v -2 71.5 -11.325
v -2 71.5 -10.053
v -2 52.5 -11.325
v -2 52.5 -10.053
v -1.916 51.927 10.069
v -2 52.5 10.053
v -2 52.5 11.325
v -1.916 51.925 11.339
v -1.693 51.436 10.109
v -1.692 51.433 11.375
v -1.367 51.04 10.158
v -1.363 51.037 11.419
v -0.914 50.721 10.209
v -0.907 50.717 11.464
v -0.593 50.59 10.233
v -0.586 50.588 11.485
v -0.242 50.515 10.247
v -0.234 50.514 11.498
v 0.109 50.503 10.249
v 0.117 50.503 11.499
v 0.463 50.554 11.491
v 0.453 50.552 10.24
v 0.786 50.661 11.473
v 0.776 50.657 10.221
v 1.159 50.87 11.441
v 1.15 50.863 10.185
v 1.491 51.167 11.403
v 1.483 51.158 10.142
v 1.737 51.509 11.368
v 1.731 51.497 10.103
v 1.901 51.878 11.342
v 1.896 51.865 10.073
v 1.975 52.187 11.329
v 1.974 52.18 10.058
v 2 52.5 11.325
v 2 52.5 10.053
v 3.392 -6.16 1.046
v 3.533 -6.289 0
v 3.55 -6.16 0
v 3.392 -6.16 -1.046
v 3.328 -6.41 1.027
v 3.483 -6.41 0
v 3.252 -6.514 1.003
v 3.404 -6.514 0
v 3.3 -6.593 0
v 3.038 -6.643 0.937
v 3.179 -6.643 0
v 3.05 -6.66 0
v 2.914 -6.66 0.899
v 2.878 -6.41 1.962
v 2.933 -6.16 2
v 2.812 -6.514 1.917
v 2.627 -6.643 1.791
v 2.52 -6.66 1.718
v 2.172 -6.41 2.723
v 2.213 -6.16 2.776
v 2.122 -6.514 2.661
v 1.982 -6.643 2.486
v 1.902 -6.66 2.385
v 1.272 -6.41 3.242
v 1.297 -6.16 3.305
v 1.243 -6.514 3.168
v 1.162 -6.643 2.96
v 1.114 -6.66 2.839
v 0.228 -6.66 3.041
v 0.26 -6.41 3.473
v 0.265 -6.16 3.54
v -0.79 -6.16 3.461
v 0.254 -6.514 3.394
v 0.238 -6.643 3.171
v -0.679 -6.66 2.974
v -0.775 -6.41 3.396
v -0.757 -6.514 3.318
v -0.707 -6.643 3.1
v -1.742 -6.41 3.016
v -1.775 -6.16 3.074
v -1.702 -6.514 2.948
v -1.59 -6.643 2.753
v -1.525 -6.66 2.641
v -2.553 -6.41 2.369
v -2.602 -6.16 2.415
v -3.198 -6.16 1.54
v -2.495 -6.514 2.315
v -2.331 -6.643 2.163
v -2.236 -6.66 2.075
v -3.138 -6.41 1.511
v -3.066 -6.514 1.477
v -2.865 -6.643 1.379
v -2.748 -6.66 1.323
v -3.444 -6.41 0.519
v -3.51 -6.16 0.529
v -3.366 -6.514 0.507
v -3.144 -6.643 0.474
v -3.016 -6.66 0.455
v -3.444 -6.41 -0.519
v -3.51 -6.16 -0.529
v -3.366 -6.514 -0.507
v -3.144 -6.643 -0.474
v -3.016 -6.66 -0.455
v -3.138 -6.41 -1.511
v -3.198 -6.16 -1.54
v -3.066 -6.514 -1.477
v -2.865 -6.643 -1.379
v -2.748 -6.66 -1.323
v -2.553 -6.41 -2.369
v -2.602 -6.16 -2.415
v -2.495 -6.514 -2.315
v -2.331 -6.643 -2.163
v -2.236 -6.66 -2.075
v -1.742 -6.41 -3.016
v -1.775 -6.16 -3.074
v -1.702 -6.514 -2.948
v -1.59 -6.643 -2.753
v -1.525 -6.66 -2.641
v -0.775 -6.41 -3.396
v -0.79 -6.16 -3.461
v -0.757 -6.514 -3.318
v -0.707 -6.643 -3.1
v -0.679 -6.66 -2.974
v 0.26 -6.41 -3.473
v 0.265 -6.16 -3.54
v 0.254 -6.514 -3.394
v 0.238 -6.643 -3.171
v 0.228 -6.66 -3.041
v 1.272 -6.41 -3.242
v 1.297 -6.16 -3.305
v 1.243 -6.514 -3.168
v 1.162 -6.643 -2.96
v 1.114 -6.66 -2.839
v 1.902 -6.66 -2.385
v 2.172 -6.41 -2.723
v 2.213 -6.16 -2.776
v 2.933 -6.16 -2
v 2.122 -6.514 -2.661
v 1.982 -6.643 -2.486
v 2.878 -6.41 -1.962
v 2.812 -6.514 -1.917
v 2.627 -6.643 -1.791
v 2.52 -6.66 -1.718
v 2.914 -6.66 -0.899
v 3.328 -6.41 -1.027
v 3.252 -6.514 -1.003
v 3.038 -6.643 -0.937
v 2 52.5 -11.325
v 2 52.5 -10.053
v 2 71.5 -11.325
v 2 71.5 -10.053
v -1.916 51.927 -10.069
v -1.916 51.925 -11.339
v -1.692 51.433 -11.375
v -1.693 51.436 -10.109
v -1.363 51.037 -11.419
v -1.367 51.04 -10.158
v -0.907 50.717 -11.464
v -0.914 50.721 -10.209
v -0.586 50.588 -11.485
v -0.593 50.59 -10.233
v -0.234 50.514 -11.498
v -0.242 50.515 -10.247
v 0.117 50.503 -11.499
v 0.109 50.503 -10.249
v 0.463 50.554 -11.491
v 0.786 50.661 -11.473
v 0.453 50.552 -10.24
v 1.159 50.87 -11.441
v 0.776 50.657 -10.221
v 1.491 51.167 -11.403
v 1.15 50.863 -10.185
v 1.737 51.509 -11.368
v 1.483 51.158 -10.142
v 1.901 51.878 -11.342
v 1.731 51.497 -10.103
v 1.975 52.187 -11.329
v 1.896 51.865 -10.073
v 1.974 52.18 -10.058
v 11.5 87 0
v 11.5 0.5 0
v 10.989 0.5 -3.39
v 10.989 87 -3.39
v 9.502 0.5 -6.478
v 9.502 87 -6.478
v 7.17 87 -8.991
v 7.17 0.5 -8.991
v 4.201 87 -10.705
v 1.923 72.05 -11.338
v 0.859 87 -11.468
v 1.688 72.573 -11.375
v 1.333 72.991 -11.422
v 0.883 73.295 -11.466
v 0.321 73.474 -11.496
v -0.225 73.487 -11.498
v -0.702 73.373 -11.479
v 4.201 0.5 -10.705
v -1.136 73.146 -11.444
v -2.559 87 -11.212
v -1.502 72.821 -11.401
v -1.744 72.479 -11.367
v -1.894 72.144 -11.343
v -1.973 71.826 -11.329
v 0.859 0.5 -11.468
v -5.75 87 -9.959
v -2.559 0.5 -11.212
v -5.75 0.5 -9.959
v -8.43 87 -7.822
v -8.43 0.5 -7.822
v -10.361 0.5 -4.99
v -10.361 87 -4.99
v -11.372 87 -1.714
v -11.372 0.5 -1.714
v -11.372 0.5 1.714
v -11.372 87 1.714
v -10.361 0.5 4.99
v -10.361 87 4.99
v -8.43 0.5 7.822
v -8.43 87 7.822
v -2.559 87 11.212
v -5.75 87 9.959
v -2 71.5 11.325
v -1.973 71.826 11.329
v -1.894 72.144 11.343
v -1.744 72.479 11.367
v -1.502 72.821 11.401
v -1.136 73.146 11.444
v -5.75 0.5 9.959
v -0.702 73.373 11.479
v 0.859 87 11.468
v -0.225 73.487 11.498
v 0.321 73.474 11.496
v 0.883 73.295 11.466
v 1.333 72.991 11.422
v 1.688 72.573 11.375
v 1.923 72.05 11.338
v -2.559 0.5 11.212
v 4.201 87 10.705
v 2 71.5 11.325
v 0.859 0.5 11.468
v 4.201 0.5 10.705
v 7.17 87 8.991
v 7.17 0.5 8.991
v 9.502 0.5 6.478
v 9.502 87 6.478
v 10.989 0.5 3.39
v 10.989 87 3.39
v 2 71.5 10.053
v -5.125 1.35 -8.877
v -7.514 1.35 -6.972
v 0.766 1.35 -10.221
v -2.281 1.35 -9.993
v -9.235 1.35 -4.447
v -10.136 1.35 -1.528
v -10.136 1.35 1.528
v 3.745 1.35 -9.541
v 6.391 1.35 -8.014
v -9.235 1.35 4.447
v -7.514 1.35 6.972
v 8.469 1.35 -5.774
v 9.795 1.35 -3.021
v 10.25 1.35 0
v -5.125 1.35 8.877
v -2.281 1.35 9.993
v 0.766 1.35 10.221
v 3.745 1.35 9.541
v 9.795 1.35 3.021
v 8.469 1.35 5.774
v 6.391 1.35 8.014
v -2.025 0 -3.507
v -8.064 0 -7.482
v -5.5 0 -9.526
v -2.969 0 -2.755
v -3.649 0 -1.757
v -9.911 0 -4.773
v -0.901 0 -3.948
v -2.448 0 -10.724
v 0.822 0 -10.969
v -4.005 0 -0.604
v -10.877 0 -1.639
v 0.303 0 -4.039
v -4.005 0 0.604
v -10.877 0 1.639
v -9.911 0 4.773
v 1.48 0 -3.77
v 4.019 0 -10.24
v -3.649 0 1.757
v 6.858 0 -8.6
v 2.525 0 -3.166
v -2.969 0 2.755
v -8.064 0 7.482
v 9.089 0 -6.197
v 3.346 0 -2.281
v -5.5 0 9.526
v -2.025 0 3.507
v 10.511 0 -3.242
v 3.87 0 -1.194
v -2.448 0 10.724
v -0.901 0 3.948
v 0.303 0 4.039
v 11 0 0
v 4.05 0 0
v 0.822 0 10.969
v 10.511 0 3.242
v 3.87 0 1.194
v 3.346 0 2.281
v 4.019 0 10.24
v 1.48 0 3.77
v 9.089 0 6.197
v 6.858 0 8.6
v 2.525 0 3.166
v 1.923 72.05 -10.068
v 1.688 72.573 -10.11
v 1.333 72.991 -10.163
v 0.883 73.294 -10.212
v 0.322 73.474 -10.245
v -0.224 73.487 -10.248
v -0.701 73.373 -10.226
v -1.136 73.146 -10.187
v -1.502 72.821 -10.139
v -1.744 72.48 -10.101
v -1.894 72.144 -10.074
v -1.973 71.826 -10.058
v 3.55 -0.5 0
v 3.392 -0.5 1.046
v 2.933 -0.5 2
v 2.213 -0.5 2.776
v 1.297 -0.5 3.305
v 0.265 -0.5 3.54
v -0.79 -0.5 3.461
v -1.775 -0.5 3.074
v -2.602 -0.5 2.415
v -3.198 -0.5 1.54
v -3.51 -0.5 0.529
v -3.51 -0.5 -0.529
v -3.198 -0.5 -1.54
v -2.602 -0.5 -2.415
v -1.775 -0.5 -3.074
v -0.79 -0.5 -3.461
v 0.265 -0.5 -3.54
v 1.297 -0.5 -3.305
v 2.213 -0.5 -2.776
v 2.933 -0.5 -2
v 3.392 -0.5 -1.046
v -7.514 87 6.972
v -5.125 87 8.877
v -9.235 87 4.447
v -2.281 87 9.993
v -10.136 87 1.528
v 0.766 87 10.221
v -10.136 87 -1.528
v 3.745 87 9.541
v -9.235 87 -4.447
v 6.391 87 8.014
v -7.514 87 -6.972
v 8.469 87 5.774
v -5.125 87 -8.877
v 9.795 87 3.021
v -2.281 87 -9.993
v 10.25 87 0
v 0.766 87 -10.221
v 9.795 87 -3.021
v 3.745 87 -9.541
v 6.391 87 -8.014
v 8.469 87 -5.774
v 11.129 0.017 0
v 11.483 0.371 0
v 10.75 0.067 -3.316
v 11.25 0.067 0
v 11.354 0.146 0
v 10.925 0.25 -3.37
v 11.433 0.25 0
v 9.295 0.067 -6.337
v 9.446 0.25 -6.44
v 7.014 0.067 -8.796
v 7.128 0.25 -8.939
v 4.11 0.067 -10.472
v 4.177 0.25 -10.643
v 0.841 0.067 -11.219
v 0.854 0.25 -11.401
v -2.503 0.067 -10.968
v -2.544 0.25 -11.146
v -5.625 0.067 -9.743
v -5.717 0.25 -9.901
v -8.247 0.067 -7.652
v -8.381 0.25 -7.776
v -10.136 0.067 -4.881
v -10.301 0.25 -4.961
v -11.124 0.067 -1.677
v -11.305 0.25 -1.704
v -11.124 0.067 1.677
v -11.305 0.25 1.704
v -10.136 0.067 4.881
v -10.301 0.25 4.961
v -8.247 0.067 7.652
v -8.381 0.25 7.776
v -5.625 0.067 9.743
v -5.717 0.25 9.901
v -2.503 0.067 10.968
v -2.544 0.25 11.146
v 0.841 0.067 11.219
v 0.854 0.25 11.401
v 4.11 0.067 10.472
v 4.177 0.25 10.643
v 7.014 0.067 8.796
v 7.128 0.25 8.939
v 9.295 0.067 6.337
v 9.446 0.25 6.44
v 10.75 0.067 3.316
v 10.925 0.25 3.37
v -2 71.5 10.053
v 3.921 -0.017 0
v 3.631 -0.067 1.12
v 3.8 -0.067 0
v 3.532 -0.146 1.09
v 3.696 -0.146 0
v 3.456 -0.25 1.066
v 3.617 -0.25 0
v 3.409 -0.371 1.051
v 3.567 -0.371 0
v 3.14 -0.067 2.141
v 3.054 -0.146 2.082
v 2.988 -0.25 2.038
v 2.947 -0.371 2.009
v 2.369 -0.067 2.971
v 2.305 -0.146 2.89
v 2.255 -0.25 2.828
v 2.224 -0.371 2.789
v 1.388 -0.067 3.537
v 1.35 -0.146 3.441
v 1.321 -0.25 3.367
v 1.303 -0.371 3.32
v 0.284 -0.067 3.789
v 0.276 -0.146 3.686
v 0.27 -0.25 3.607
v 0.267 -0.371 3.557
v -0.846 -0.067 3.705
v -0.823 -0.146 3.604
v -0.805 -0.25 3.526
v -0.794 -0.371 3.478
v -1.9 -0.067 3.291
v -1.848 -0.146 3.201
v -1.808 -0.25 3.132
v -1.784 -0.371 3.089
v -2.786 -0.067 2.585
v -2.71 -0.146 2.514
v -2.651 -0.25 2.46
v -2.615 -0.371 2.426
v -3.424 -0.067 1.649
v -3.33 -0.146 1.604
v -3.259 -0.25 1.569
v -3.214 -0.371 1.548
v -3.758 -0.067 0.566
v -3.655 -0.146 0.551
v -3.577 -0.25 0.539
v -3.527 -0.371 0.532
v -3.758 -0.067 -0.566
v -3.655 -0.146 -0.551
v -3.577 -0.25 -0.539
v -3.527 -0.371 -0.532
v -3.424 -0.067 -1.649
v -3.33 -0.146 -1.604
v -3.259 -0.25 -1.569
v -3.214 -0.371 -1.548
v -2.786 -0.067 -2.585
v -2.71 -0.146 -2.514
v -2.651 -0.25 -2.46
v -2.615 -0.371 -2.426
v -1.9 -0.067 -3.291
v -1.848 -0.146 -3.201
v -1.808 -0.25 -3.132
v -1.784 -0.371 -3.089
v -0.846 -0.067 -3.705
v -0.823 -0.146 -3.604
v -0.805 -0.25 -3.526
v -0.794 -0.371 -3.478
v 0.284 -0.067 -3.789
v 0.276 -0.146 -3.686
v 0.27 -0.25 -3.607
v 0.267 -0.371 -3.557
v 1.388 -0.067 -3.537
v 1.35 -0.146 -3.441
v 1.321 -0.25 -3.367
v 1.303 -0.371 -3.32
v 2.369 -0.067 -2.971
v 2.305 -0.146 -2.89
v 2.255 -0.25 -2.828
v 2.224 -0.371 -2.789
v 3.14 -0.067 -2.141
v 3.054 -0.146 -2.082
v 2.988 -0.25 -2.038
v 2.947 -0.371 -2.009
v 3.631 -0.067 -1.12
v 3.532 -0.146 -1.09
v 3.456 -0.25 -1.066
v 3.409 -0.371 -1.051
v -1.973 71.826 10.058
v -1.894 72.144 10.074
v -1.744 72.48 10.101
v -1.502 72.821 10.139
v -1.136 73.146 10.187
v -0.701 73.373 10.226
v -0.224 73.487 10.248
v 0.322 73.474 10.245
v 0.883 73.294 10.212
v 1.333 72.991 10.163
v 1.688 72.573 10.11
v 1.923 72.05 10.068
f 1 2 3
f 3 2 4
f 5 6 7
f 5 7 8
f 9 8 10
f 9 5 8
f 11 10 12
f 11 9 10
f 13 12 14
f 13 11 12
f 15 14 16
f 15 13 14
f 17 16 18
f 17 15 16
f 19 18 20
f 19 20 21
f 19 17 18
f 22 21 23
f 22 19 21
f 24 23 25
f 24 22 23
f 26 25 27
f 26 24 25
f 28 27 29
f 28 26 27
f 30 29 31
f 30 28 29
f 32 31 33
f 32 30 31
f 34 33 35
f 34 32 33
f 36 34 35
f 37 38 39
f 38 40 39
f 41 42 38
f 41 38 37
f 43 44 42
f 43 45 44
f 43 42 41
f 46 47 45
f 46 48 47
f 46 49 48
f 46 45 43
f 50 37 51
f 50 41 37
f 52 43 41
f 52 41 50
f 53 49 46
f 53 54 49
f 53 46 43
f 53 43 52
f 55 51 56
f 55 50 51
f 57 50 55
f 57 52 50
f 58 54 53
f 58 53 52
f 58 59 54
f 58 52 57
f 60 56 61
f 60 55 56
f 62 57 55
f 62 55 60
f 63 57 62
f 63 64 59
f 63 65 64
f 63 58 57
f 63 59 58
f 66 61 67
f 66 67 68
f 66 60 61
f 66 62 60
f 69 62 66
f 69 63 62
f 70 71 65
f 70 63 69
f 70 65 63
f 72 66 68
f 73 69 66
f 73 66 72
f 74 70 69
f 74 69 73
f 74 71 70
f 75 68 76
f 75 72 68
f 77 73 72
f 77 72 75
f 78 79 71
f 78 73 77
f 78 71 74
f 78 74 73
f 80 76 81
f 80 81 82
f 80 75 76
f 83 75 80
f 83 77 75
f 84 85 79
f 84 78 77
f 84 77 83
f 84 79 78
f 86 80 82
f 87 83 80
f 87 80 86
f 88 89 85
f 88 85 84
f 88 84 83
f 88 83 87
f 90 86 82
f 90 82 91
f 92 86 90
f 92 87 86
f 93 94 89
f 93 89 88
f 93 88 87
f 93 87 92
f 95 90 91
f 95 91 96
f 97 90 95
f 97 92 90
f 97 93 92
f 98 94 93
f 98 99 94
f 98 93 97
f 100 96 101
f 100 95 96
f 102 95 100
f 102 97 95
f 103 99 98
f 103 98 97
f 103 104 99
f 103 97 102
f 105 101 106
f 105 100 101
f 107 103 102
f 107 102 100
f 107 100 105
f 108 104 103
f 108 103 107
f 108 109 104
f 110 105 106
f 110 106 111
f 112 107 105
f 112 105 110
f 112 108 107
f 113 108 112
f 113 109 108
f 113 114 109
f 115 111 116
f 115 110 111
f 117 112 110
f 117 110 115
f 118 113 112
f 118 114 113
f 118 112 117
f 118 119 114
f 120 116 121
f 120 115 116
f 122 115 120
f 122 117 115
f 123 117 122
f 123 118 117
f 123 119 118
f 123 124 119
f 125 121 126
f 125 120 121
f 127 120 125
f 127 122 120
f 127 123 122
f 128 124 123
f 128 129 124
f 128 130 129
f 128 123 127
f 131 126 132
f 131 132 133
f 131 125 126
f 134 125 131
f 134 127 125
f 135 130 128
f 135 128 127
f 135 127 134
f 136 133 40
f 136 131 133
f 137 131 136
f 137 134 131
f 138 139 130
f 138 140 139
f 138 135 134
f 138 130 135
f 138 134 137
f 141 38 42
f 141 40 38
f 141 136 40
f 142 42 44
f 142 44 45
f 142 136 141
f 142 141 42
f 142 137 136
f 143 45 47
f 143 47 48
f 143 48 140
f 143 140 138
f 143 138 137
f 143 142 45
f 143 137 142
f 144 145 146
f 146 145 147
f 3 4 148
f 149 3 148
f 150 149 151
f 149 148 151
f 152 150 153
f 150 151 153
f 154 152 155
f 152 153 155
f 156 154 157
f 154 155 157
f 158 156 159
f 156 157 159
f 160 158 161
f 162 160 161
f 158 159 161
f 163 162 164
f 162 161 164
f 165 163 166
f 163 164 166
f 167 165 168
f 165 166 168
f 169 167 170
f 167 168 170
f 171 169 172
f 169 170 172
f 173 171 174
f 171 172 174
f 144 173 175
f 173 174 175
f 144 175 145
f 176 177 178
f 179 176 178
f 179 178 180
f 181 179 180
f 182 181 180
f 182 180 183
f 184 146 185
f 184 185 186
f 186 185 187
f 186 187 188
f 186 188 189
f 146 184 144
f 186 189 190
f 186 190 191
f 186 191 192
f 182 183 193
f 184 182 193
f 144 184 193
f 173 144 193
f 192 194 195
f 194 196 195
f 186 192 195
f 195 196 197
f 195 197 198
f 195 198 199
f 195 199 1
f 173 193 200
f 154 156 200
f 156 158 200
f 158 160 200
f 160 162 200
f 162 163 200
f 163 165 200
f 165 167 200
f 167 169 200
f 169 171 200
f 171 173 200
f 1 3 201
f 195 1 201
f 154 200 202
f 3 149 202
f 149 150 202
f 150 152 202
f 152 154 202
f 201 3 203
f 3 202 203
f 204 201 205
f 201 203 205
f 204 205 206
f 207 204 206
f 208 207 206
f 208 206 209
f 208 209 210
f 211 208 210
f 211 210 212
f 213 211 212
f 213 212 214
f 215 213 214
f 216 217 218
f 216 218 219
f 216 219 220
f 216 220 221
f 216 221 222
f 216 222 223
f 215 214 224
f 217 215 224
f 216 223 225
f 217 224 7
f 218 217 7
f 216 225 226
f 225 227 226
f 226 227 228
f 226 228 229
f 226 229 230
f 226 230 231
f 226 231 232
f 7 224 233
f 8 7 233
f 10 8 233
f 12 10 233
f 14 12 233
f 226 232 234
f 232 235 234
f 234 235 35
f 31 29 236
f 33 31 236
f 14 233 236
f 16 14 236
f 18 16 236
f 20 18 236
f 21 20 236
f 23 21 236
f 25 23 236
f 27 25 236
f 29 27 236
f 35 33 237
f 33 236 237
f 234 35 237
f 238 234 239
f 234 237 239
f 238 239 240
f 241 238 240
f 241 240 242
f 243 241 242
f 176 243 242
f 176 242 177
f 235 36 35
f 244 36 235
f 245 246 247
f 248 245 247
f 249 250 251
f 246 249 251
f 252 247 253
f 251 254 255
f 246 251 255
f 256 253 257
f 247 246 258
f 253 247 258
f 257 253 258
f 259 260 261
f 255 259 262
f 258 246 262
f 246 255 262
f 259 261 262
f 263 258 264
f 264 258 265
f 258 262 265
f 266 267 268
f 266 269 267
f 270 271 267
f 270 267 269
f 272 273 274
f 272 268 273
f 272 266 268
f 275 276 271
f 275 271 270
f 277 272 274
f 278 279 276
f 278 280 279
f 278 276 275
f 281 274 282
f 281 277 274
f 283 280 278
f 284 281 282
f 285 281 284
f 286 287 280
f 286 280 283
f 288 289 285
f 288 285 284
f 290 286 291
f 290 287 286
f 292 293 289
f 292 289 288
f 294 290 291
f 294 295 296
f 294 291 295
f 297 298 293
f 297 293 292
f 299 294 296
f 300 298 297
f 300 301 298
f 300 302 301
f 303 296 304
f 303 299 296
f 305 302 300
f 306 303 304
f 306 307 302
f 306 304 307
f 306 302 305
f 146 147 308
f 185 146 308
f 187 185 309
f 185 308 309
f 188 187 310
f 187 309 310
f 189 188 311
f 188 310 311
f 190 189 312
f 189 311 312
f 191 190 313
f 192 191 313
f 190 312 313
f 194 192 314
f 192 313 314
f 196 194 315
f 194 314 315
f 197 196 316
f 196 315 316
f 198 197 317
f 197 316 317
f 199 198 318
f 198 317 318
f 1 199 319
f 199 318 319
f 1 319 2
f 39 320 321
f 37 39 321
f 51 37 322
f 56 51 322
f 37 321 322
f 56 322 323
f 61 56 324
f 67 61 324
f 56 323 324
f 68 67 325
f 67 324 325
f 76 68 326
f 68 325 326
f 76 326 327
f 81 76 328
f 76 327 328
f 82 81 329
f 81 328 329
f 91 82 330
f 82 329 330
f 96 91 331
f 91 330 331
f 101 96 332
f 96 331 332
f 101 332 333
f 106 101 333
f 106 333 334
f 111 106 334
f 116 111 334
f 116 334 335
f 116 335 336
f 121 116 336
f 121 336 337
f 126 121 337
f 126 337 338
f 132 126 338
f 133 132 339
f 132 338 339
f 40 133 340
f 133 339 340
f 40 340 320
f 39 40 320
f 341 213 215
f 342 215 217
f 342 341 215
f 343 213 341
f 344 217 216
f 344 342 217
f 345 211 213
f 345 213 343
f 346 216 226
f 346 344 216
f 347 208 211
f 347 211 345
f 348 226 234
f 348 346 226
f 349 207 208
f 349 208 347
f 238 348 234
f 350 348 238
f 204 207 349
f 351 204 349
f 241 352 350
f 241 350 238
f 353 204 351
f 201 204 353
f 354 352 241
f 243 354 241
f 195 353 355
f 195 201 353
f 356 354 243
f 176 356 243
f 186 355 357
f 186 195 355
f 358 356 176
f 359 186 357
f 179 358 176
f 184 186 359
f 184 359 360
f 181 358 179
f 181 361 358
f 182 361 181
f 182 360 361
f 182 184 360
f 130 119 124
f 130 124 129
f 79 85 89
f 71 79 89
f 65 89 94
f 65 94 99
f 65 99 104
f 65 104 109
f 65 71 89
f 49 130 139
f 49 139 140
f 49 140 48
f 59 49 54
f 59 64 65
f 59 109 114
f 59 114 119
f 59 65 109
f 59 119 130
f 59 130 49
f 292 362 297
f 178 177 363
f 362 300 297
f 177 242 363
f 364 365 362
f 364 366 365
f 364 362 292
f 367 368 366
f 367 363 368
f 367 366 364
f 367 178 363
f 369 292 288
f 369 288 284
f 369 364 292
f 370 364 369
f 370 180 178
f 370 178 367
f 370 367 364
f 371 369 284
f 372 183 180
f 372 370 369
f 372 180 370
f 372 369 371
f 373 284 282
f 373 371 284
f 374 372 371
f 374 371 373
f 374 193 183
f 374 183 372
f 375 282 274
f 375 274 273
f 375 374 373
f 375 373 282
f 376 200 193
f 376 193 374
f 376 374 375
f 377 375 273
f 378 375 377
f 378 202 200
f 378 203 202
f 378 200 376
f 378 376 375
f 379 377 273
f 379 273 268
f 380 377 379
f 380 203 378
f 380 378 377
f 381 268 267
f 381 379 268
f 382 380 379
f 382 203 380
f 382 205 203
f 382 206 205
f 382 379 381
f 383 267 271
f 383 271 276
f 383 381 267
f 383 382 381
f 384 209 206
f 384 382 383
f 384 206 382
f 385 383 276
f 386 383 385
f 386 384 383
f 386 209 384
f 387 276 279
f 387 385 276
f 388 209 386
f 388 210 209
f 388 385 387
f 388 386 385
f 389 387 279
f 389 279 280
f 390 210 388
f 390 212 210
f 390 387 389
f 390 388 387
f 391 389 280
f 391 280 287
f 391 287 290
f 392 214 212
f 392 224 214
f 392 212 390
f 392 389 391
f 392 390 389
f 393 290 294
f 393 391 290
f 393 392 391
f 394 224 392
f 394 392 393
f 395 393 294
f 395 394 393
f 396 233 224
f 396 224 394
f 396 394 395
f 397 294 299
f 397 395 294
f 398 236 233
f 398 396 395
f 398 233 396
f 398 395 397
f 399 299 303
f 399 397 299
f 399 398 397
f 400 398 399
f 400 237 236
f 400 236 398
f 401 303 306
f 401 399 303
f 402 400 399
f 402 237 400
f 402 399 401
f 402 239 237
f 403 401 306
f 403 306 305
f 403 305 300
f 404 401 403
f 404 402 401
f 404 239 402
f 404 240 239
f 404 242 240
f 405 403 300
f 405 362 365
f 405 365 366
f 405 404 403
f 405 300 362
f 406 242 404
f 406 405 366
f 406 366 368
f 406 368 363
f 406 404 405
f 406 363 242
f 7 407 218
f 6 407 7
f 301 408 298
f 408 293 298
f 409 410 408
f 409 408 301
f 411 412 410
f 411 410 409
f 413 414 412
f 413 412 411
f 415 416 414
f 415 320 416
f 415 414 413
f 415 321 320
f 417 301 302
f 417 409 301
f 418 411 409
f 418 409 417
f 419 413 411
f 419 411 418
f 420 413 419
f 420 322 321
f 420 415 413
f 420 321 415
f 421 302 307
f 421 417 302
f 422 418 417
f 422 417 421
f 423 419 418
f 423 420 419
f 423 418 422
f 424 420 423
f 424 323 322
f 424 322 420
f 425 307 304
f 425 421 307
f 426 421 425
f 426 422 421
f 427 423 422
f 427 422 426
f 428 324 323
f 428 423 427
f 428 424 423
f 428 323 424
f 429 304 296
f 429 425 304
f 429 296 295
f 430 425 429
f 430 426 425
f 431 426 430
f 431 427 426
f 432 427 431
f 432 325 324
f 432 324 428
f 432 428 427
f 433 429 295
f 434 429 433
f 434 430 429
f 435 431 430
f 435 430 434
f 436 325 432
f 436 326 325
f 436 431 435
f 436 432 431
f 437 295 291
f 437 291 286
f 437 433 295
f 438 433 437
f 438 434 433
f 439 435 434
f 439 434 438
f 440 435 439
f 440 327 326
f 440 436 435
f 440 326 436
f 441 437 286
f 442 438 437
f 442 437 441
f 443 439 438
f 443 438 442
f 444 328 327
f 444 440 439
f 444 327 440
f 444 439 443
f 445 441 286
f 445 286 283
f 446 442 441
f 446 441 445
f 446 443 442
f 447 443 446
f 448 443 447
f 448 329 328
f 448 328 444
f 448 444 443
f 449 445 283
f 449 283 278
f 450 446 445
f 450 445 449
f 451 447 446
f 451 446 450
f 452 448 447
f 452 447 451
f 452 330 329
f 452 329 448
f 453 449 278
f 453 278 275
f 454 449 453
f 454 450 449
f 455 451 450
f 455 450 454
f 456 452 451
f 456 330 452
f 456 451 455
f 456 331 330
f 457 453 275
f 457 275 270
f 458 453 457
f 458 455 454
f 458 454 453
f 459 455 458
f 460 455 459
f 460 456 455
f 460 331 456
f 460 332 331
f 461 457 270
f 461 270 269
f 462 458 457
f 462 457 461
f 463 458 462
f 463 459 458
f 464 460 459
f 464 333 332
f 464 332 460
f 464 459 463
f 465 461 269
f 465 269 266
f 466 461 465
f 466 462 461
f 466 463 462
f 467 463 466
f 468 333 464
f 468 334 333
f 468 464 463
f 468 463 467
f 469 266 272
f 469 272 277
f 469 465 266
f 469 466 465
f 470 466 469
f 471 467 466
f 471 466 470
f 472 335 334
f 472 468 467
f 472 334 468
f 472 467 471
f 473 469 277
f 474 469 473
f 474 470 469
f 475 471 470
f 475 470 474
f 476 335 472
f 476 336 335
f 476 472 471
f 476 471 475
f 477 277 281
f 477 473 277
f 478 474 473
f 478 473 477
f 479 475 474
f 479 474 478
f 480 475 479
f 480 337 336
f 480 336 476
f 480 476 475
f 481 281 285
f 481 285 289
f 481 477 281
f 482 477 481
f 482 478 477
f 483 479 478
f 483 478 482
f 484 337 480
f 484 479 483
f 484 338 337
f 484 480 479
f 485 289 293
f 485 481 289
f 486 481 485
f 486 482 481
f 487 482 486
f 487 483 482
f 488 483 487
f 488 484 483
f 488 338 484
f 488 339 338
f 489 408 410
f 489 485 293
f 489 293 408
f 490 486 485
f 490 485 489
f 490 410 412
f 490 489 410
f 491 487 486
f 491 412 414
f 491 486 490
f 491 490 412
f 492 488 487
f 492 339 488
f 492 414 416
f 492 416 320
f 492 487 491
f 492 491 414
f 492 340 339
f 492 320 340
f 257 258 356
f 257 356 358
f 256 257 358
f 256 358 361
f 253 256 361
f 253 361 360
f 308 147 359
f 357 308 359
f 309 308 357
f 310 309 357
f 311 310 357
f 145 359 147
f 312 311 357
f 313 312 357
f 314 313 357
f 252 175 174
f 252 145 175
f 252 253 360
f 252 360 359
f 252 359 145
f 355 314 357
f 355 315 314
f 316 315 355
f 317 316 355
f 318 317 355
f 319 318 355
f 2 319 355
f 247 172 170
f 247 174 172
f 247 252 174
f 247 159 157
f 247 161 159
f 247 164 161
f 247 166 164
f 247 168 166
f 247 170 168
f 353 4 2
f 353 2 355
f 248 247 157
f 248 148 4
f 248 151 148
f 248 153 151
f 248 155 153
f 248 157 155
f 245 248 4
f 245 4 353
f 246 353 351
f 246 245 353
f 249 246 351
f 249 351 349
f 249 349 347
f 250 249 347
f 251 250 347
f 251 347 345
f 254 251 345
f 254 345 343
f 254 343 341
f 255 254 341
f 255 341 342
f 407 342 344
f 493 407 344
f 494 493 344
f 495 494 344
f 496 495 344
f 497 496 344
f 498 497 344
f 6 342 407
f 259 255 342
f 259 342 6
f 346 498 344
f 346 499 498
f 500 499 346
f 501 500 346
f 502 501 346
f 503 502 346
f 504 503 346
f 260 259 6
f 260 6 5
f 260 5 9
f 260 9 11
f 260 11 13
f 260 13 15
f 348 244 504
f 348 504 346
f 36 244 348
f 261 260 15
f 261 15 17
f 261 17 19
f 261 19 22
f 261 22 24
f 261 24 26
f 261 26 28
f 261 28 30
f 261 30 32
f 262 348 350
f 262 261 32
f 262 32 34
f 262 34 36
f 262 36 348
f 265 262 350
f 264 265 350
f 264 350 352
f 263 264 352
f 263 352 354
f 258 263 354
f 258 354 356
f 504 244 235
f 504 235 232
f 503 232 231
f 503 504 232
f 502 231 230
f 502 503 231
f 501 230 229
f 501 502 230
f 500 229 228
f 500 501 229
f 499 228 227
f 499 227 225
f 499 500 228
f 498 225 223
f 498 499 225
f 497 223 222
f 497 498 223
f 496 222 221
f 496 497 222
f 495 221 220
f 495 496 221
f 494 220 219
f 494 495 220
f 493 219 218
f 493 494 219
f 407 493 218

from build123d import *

# Parameters (mm, degrees)
SKETCH1_R               = 11.5
SKETCH1_R_2             = 10.25
BOSS_EXTRUDE1_DEPTH     = 87
SKETCH2_R               = 10.25
BOSS_EXTRUDE2_DEPTH     = 1.35
SKETCH3_R               = 3.55
BOSS_EXTRUDE3_DEPTH     = 6.66
CUT_EXTRUDE1_DEPTH      = 12.5
CUT_EXTRUDE1_DEPTH_BACK = 12.5
FILLET1_R               = 0.5


with BuildPart() as part:
    # Sketch1 → Boss-Extrude1 (new body)
    with BuildSketch(Plane(origin=(0, 0, 0), x_dir=(1, 0, 0), z_dir=(0, 1, 0))):
        Circle(SKETCH1_R)
        Circle(SKETCH1_R_2, mode=Mode.SUBTRACT)
    extrude(amount=BOSS_EXTRUDE1_DEPTH)

    # Sketch2 → Boss-Extrude2 (add)
    with BuildSketch(Plane.XZ):
        Circle(SKETCH2_R)
    extrude(amount=-BOSS_EXTRUDE2_DEPTH)

    # Sketch3 → Boss-Extrude3 (add)
    with BuildSketch(Plane.XZ):
        Circle(SKETCH3_R)
    extrude(amount=BOSS_EXTRUDE3_DEPTH)

    # Sketch4 → Cut-Extrude1 (cut, two sides)
    with BuildSketch(Plane.XY) as cut_extrude1_sk:
        with BuildLine():
            Line((-2, 71.5), (-2, 52.5))
            ThreePointArc((-2, 52.5), (0, 50.5), (2, 52.5))
            Line((2, 52.5), (2, 71.5))
            ThreePointArc((2, 71.5), (0, 73.5), (-2, 71.5))
        make_face()
    extrude(amount=CUT_EXTRUDE1_DEPTH, mode=Mode.SUBTRACT)
    extrude(cut_extrude1_sk.sketch, amount=-CUT_EXTRUDE1_DEPTH_BACK, mode=Mode.SUBTRACT)

    # Fillet1
    fillet1_edges = [part.edges().sort_by_distance(p)[0] for p in [
        (-3.55, 0, 0),
        (-3.55, -6.66, 0),
        (-11.5, 0, 0),
    ]]
    fillet(fillet1_edges, radius=FILLET1_R)


solid = part.part
